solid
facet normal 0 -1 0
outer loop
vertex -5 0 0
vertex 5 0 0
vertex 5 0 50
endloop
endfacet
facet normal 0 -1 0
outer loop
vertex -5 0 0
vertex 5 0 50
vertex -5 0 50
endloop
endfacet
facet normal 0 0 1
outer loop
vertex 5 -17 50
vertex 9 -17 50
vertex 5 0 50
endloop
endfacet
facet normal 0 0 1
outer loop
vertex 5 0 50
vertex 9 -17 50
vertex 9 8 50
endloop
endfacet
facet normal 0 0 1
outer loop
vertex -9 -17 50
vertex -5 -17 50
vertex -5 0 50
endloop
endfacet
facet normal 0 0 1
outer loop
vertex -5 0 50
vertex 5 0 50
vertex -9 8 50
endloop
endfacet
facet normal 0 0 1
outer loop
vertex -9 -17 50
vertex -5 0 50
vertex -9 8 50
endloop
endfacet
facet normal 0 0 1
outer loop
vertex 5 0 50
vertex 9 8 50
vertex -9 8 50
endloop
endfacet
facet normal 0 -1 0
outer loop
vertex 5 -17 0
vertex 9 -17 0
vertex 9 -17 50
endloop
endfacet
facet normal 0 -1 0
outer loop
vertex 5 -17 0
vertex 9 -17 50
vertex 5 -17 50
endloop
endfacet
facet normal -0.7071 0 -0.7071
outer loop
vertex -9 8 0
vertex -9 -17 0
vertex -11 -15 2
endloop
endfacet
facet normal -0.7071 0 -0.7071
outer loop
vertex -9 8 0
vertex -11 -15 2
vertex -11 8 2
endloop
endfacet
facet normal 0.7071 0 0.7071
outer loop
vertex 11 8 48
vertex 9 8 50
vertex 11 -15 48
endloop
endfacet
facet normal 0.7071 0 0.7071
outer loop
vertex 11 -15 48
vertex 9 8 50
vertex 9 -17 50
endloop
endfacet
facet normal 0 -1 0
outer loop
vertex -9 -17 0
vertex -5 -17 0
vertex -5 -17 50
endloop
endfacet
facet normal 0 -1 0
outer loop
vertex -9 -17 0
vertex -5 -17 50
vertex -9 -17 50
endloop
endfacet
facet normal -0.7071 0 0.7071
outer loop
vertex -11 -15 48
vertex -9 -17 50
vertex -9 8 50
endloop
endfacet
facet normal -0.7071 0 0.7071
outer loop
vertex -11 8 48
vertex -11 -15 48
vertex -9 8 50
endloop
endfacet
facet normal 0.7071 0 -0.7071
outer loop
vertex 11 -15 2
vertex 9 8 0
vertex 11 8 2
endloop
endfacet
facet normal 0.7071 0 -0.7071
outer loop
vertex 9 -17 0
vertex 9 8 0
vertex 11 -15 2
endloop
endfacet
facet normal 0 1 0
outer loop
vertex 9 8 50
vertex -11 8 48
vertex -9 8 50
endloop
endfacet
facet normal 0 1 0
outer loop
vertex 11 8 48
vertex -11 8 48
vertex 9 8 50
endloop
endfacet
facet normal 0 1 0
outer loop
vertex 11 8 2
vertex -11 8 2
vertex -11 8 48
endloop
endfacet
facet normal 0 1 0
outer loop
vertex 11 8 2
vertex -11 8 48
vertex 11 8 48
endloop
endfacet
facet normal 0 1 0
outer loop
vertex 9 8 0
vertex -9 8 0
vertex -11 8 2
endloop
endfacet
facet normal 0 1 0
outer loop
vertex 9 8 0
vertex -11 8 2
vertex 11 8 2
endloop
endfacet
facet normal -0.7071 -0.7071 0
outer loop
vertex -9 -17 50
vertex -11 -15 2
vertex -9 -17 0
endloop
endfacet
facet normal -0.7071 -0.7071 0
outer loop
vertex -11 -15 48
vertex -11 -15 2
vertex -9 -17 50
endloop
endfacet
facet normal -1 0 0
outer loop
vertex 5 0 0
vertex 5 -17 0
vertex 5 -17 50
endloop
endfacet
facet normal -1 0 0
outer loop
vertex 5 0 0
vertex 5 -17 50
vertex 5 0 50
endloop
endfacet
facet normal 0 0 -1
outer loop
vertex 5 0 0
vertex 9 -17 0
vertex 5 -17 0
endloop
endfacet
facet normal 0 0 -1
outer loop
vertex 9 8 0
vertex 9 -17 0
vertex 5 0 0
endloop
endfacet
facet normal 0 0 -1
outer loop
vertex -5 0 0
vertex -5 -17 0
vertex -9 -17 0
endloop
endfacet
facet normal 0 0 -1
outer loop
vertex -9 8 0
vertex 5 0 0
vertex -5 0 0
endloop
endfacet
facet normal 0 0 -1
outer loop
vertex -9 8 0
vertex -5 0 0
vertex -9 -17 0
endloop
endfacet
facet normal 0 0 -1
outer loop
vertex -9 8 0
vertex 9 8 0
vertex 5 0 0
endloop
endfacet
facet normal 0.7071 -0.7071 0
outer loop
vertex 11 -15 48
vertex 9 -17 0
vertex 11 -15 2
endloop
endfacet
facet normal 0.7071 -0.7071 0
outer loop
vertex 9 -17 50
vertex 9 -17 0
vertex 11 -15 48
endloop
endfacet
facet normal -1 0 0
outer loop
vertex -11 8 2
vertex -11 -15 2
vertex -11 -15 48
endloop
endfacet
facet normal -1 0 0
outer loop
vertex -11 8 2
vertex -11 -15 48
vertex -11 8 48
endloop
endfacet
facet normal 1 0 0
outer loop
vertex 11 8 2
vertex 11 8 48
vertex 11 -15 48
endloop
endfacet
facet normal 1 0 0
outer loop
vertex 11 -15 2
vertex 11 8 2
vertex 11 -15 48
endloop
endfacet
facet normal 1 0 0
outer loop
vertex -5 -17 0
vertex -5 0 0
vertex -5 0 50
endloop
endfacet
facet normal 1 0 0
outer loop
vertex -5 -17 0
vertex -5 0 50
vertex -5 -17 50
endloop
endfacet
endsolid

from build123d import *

# Parameters (mm, degrees)
ESTRUSIONE_ESTRUSIONE1_DEPTH = 50
SMUSSO1_SIZE                 = 2


with BuildPart() as part:
    # Schizzo1 → Estrusione-Estrusione1 (new body)
    with BuildSketch(Plane.XY):
        Polygon((5, 0), (-5, 0), (-5, -17), (-11, -17), (-11, 8), (11, 8), (11, -17), (5, -17), align=None)
    extrude(amount=ESTRUSIONE_ESTRUSIONE1_DEPTH)

    # Smusso1
    smusso1_edges = [part.edges().sort_by_distance(p)[0] for p in [
        (11, -4.5, 0),
        (11, -4.5, 50),
        (-11, -17, 25),
        (11, -17, 25),
        (-11, -4.5, 50),
        (-11, -4.5, 0),
    ]]
    chamfer(smusso1_edges, length=SMUSSO1_SIZE)


solid = part.part
